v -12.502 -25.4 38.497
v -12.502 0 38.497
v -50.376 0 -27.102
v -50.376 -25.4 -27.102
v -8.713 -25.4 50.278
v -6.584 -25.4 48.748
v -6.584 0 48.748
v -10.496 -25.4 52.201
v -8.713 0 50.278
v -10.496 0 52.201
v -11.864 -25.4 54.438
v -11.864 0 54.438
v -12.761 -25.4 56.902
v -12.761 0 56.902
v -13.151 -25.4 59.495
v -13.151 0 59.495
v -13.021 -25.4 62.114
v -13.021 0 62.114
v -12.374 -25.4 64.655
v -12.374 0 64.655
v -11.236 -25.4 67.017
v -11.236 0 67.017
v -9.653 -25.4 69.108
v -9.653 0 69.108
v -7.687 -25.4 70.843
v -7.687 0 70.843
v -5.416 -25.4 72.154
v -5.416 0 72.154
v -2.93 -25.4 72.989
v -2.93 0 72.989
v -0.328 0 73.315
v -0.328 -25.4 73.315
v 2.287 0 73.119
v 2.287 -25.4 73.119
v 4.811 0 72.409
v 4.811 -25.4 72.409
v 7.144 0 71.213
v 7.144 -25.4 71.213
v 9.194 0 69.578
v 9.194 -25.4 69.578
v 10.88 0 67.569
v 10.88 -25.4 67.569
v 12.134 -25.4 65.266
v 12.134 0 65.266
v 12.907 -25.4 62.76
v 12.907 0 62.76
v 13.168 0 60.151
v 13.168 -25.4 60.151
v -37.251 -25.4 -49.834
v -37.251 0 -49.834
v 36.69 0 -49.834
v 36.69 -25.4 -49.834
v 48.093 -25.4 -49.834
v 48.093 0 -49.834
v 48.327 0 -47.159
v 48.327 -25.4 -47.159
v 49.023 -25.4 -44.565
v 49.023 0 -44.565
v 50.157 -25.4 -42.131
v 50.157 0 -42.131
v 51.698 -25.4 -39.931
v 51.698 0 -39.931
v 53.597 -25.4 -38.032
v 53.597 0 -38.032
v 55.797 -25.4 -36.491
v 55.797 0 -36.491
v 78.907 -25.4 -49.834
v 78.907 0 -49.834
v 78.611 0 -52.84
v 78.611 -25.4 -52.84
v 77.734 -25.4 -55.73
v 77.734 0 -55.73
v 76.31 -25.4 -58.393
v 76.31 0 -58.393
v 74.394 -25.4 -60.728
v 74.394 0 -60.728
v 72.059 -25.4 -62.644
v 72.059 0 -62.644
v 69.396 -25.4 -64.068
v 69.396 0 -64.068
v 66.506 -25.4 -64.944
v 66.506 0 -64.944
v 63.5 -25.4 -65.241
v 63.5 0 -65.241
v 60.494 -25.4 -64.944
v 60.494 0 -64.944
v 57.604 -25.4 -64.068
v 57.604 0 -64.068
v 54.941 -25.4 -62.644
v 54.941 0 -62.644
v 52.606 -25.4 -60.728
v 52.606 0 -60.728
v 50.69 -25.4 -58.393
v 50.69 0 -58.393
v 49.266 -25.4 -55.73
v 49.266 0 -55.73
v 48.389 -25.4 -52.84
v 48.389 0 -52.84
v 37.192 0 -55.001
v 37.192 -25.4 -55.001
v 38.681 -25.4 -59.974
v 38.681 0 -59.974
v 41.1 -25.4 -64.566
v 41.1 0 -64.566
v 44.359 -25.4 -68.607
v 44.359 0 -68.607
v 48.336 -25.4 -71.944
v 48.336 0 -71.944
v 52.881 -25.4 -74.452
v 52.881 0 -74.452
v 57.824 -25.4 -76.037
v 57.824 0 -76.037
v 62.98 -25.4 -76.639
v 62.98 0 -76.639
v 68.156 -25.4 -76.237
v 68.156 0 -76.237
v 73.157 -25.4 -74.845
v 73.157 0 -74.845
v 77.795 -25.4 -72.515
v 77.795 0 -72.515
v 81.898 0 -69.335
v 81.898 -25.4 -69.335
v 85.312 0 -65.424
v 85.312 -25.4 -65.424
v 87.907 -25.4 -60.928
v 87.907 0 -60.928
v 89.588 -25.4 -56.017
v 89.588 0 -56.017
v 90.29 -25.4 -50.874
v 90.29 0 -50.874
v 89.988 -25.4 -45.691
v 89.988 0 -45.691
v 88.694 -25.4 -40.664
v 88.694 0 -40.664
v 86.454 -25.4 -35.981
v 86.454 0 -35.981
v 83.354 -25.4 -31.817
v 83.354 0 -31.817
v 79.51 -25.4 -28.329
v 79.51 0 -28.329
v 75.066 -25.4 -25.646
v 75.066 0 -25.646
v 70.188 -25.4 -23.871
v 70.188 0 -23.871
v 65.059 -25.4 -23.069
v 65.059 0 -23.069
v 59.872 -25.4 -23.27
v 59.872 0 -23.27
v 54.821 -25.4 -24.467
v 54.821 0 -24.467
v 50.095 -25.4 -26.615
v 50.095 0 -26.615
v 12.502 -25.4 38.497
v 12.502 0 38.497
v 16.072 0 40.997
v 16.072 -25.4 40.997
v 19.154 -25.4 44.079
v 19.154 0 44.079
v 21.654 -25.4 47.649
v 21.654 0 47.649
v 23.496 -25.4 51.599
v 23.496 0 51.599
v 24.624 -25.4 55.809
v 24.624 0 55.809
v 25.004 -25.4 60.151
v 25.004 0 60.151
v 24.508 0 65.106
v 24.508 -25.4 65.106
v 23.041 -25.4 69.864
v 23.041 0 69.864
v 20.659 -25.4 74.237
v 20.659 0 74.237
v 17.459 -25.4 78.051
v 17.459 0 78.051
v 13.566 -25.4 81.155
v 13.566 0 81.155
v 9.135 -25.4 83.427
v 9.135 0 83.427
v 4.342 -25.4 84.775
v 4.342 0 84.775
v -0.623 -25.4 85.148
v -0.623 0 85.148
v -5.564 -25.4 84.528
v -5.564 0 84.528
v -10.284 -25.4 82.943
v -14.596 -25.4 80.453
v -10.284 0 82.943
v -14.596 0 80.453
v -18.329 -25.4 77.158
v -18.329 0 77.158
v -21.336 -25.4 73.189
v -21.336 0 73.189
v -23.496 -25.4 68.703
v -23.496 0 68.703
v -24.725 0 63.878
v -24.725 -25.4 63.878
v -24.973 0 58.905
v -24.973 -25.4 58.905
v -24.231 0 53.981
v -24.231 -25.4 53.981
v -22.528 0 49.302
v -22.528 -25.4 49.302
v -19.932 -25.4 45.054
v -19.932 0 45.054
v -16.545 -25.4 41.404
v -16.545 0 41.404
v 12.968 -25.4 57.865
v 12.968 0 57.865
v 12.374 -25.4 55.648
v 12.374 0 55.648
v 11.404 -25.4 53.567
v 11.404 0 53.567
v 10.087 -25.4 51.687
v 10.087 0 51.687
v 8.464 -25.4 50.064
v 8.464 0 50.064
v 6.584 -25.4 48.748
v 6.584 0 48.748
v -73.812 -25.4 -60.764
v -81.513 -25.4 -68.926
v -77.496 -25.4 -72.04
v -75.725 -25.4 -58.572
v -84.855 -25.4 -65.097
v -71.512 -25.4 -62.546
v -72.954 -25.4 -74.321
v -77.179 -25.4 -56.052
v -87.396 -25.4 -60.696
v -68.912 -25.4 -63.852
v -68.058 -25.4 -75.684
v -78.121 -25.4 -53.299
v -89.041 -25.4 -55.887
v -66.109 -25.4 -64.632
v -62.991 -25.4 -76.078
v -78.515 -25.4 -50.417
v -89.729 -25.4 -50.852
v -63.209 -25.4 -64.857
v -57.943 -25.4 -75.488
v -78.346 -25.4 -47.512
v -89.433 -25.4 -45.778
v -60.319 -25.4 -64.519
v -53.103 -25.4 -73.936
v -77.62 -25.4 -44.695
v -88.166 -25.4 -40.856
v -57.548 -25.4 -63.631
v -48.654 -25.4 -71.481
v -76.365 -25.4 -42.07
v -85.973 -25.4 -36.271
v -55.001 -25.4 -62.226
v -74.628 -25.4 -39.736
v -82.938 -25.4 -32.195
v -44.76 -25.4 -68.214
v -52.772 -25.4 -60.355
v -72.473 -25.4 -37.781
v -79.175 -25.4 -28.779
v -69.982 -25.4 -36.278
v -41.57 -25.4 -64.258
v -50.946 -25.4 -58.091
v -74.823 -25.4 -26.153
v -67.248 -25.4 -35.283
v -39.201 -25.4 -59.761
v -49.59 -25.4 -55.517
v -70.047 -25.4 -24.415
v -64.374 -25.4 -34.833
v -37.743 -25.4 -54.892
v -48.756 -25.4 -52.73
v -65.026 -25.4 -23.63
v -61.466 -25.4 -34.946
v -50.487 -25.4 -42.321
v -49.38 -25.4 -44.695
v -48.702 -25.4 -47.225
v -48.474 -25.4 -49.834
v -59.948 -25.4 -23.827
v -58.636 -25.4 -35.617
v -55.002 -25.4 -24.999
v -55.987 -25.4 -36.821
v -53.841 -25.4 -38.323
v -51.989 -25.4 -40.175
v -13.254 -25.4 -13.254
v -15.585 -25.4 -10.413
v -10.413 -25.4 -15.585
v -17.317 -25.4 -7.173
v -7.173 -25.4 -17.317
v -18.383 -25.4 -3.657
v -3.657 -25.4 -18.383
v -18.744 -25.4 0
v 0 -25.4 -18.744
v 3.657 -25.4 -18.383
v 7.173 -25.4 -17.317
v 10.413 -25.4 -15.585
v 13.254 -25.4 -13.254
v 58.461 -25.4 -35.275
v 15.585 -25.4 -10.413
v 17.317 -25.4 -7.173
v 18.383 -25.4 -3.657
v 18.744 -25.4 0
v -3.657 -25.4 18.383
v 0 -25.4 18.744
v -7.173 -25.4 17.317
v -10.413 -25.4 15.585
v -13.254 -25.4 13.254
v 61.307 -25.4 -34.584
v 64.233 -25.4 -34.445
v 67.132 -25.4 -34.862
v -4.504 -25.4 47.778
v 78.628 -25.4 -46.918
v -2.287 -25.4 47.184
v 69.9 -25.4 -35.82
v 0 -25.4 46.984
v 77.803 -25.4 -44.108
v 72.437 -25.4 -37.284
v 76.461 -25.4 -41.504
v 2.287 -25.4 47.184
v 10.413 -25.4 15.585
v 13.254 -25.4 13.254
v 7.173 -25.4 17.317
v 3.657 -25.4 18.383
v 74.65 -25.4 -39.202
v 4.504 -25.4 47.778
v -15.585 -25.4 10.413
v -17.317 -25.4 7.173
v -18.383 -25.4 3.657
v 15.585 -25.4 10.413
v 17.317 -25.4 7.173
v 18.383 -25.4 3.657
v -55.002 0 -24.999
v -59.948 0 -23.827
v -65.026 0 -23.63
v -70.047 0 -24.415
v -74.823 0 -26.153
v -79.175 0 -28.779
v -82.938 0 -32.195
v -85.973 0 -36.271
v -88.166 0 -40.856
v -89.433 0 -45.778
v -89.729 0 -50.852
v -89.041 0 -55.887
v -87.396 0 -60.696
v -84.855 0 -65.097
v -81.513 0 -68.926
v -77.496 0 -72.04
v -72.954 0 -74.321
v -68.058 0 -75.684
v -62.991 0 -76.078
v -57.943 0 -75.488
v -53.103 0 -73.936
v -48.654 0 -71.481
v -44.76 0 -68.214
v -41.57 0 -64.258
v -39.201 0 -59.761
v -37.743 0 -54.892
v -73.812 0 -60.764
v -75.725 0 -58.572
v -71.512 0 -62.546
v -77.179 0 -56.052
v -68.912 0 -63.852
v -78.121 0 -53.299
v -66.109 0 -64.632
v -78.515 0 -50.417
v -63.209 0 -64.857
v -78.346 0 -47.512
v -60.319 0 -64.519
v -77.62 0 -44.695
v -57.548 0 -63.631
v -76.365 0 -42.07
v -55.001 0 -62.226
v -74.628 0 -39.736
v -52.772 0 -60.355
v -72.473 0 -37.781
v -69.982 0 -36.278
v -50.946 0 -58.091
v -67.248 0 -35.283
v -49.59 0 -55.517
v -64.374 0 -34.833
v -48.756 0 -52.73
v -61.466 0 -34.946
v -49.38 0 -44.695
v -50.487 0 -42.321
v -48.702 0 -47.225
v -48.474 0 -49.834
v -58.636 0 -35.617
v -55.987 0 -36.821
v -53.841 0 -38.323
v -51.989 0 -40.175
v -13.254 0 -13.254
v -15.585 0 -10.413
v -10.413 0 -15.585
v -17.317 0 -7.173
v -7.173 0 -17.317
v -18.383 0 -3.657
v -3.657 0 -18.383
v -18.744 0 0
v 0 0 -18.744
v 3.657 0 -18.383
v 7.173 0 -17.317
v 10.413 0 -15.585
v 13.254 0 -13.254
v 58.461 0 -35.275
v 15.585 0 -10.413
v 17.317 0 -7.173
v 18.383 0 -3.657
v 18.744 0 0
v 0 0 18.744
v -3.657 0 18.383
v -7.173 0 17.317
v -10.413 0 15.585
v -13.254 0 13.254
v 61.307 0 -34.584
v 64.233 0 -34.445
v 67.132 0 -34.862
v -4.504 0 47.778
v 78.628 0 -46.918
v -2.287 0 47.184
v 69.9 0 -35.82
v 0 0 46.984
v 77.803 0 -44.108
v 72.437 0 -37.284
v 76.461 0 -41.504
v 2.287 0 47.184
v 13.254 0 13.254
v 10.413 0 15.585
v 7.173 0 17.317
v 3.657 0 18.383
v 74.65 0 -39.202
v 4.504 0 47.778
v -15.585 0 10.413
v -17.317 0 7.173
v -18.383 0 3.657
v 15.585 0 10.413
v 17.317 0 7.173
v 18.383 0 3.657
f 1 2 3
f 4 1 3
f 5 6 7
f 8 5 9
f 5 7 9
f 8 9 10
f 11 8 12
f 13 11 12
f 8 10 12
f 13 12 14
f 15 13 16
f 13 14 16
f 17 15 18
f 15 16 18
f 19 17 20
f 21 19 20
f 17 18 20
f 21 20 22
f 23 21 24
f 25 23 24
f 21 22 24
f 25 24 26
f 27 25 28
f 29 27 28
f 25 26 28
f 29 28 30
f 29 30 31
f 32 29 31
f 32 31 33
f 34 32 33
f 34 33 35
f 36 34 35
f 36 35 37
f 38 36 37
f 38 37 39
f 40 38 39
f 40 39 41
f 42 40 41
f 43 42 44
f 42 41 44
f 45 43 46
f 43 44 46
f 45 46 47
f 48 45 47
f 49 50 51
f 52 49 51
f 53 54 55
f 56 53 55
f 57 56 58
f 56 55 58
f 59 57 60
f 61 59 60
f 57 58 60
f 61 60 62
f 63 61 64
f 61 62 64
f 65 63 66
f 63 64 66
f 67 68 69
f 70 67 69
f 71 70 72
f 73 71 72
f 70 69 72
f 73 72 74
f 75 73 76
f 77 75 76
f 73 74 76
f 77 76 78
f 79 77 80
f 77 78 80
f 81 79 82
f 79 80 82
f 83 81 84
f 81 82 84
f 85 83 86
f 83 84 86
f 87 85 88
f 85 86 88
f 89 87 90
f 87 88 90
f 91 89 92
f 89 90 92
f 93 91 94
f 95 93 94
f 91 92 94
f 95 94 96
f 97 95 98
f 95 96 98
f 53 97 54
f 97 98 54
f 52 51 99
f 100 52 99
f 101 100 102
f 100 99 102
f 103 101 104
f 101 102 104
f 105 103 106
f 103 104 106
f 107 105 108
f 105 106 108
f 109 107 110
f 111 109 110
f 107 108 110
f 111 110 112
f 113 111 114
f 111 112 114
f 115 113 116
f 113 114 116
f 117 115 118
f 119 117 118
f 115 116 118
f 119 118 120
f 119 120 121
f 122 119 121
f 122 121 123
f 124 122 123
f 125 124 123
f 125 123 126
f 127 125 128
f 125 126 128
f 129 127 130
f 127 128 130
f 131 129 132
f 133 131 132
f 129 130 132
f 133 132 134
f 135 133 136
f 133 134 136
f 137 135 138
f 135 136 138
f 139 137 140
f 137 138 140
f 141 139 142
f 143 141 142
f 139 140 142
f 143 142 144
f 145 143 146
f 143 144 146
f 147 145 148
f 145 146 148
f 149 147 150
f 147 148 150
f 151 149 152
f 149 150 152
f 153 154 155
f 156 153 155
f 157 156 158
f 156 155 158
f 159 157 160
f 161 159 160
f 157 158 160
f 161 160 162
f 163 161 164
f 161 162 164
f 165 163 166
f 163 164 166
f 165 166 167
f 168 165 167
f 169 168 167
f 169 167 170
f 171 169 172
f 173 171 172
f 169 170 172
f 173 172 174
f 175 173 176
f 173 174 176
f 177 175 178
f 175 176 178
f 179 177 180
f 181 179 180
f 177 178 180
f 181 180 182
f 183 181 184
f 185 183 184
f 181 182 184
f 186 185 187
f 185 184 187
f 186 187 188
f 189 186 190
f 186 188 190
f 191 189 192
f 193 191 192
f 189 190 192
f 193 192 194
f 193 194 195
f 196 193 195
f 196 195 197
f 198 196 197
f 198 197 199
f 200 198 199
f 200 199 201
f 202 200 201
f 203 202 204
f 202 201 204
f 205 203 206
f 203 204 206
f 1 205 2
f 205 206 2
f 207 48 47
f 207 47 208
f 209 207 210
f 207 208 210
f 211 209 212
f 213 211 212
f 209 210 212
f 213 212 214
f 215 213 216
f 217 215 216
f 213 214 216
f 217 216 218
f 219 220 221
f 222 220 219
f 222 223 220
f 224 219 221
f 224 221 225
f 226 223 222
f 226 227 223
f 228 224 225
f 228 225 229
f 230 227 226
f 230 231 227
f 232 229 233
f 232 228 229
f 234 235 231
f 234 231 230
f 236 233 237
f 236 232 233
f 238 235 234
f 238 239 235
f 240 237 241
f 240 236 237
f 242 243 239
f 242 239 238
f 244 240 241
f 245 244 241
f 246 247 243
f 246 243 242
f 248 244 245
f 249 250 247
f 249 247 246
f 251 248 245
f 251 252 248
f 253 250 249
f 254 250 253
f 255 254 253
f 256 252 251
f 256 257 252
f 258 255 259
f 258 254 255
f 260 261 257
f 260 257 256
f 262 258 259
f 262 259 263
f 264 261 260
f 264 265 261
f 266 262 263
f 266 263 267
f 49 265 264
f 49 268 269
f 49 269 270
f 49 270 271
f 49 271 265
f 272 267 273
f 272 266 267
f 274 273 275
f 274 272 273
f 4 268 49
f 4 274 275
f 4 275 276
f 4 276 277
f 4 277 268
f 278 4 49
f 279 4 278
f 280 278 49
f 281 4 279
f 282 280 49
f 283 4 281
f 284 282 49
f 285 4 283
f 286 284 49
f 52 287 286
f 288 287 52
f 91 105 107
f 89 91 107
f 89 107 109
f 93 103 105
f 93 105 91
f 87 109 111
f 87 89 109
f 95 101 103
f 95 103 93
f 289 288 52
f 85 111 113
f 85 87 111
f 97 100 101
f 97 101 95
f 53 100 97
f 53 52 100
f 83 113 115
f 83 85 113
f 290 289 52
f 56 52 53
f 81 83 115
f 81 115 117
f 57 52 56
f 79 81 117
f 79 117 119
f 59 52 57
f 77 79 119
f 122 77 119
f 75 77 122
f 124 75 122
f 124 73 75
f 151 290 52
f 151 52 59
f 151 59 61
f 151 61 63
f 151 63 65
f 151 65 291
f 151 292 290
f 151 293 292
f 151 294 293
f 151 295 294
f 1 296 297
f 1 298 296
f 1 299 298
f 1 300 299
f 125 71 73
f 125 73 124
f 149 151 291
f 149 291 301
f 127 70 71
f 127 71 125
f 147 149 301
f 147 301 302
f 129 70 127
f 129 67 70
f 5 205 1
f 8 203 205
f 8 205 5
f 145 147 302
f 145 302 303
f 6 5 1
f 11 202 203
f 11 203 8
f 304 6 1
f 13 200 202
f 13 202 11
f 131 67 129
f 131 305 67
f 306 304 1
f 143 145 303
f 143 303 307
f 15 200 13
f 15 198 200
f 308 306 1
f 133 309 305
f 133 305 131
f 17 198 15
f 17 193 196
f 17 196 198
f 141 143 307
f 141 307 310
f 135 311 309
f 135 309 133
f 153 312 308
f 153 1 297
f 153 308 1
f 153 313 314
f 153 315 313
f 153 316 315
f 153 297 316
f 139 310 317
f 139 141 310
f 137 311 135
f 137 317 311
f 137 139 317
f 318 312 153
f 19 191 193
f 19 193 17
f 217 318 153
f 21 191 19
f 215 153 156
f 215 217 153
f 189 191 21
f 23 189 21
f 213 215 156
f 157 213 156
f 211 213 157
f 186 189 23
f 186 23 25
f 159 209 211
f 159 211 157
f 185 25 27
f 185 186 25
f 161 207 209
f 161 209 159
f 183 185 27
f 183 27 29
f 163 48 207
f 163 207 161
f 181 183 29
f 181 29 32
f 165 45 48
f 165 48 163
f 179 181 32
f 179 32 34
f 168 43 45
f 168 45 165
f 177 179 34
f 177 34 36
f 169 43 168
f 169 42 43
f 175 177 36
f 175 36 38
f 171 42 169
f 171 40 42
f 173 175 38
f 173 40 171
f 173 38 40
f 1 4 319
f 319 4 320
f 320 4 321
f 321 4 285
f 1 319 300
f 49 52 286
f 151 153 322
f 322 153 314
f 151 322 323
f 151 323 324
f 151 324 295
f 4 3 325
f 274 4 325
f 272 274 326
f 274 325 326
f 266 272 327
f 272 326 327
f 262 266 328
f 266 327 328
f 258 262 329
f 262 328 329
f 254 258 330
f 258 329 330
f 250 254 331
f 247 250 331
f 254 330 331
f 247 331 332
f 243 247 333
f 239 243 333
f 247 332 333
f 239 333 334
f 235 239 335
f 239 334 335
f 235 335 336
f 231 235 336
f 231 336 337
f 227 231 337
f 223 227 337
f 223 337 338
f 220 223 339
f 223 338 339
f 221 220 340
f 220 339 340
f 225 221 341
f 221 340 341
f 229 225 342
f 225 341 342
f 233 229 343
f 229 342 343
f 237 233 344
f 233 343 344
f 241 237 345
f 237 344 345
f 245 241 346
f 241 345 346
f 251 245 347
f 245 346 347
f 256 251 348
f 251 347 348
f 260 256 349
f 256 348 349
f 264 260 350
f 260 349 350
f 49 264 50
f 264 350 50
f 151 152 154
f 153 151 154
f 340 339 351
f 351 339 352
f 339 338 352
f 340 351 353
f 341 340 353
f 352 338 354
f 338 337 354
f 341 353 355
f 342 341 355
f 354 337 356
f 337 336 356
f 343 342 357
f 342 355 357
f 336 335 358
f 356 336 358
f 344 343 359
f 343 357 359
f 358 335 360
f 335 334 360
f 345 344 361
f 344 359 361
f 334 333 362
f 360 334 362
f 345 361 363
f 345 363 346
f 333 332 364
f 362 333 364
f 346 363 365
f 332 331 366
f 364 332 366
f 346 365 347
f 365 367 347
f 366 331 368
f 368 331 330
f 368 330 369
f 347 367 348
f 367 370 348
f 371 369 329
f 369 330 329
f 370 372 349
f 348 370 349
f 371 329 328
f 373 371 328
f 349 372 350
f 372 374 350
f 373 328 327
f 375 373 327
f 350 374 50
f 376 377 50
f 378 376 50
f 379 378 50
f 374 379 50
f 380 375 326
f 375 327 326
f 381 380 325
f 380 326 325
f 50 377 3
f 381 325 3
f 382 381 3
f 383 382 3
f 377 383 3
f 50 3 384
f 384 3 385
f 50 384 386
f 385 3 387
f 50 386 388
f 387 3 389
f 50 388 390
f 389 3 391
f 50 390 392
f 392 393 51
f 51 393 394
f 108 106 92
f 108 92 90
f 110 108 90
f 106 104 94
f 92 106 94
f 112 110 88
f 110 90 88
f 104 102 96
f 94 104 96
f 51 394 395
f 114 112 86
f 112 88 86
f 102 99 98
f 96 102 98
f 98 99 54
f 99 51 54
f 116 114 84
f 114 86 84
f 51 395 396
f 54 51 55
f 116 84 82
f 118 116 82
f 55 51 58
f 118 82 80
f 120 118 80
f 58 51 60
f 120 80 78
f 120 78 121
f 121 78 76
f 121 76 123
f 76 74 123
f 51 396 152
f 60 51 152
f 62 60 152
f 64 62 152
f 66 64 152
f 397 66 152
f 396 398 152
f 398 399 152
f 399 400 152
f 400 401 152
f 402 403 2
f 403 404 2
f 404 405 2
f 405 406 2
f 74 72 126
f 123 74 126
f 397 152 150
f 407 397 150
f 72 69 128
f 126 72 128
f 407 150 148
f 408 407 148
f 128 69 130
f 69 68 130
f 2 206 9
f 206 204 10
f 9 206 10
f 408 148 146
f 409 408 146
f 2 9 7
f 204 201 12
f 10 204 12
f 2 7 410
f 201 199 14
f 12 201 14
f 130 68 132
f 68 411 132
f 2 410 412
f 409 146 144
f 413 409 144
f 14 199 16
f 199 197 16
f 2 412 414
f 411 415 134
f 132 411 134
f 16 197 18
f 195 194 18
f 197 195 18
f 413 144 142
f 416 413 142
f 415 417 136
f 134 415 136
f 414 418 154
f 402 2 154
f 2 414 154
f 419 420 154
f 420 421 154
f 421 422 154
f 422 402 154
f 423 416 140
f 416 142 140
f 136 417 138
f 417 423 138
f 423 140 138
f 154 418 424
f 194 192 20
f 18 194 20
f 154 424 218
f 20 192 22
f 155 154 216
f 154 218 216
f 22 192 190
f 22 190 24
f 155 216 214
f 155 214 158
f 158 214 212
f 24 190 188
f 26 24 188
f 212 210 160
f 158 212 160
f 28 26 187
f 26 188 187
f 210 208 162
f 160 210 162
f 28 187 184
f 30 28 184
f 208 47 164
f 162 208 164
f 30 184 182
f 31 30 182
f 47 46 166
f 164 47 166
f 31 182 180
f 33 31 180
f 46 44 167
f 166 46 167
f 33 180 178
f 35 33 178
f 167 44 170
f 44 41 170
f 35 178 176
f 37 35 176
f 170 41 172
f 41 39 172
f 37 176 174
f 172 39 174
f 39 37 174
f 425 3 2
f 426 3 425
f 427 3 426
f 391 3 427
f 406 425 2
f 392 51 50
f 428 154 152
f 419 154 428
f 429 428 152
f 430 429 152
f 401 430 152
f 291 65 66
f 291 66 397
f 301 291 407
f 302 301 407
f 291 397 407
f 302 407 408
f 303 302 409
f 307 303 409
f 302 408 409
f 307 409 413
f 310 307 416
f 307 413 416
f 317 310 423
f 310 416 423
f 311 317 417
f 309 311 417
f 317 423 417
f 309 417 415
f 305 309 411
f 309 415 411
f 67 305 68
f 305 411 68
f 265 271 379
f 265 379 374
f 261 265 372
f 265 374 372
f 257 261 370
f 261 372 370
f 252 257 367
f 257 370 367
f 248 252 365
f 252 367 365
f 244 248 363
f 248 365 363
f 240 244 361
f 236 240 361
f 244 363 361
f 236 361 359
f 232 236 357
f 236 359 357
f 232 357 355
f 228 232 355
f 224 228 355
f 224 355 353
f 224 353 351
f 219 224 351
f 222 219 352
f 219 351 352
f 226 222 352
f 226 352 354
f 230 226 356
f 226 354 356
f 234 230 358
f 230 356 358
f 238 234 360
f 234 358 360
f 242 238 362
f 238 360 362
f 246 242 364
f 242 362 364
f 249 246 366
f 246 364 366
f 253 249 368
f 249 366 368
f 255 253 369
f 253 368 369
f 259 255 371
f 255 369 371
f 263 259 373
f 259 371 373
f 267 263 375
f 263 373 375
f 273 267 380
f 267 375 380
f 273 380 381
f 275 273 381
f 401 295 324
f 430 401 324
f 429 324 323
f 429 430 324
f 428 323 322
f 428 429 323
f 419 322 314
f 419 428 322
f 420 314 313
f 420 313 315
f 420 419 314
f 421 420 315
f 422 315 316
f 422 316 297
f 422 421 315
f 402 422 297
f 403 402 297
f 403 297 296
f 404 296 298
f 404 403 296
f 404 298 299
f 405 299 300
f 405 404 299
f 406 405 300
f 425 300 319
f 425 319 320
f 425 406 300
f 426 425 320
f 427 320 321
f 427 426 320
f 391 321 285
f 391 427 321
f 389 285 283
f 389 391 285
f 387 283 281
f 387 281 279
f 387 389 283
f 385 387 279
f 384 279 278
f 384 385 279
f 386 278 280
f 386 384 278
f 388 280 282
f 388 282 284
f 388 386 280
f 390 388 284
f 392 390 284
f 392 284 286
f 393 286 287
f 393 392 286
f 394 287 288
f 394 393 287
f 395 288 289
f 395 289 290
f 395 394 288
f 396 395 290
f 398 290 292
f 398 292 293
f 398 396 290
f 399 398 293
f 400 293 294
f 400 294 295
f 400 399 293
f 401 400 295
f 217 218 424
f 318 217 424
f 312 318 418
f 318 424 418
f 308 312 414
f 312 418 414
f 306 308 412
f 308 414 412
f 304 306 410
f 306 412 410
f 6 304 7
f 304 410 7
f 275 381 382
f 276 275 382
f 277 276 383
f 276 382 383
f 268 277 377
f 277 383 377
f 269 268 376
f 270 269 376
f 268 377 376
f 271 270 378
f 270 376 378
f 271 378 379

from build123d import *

# Parameters (mm, degrees)
F0_R     = 18.7435509256
F1_DEPTH = 25.4


with BuildPart() as f1:
    # F0 (on Front) → F1 (new body)
    with BuildSketch(Plane.XZ):
        with BuildLine():
            Line((-12.5020157932, 38.4971815486), (-6.5838834434, 48.7476874643))
            ThreePointArc((-6.5838834434, 48.7476874643), (-6.5838834434, 71.5549287346), (13.1677668869, 60.1513080994))
            ThreePointArc((13.1677668869, 60.1513080994), (11.4036206351, 53.567424656), (6.5838834434, 48.7476874643))
            Line((6.5838834434, 48.7476874643), (12.5020157932, 38.4971815486))
            ThreePointArc((12.5020157932, 38.4971815486), (21.6541265509, 47.6492923062), (25.0040315864, 60.1513080994))
            ThreePointArc((25.0040315864, 60.1513080994), (-12.5020157932, 81.8054346503), (-12.5020157932, 38.4971815486))
        make_face()
        with BuildLine():
            ThreePointArc((6.5838834434, 48.7476874643), (0, 46.9835412126), (-6.5838834434, 48.7476874643))
            Line((-6.5838834434, 48.7476874643), (-12.5020157932, 38.4971815486))
            ThreePointArc((-12.5020157932, 38.4971815486), (0, 35.147276513), (12.5020157932, 38.4971815486))
            Line((12.5020157932, 38.4971815486), (6.5838834434, 48.7476874643))
        make_face()
        with BuildLine():
            ThreePointArc((12.5020157932, 38.4971815486), (0, 35.147276513), (-12.5020157932, 38.4971815486))
            Line((-12.5020157932, 38.4971815486), (-50.3756712224, -27.1019139232))
            ThreePointArc((-50.3756712224, -27.1019139232), (-40.767995742, -36.7095894036), (-37.2513424448, -49.8339181812))
            Line((-37.2513424448, -49.8339181812), (36.6895705679, -49.8339181812))
            ThreePointArc((36.6895705679, -49.8339181812), (40.2814870254, -36.4287034651), (50.094785284, -26.6154052066))
            Line((50.094785284, -26.6154052066), (12.5020157932, 38.4971815486))
        make_face()
        Circle(F0_R, mode=Mode.SUBTRACT)
        with BuildLine():
            Line((55.796700688, -36.491412387), (50.094785284, -26.6154052066))
            ThreePointArc((50.094785284, -26.6154052066), (40.2814870254, -36.4287034651), (36.6895705679, -49.8339181812))
            Line((36.6895705679, -49.8339181812), (48.0934013761, -49.8339181812))
            ThreePointArc((48.0934013761, -49.8339181812), (50.1574942058, -42.1306188692), (55.796700688, -36.491412387))
        make_face()
        with BuildLine():
            ThreePointArc((90.3104294321, -49.8339181812), (76.905214716, -26.6154052066), (50.094785284, -26.6154052066))
            Line((50.094785284, -26.6154052066), (55.796700688, -36.491412387))
            ThreePointArc((55.796700688, -36.491412387), (71.203299312, -36.491412387), (78.9065986239, -49.8339181812))
            ThreePointArc((78.9065986239, -49.8339181812), (63.5, -65.2405168051), (48.0934013761, -49.8339181812))
            Line((48.0934013761, -49.8339181812), (36.6895705679, -49.8339181812))
            ThreePointArc((36.6895705679, -49.8339181812), (63.5, -76.6443476133), (90.3104294321, -49.8339181812))
        make_face()
        with BuildLine():
            ThreePointArc((-37.2513424448, -49.8339181812), (-40.767995742, -36.7095894036), (-50.3756712224, -27.1019139232))
            Line((-50.3756712224, -27.1019139232), (-55.9869244457, -36.8208896001))
            ThreePointArc((-55.9869244457, -36.8208896001), (-50.4869714189, -42.3208426269), (-48.4738488914, -49.8339181812))
            Line((-48.4738488914, -49.8339181812), (-37.2513424448, -49.8339181812))
        make_face()
        with BuildLine():
            Line((-55.9869244457, -36.8208896001), (-50.3756712224, -27.1019139232))
            ThreePointArc((-50.3756712224, -27.1019139232), (-86.232004258, -62.9582469588), (-37.2513424448, -49.8339181812))
            Line((-37.2513424448, -49.8339181812), (-48.4738488914, -49.8339181812))
            ThreePointArc((-48.4738488914, -49.8339181812), (-76.5130285811, -57.3469937355), (-55.9869244457, -36.8208896001))
        make_face()
    extrude(amount=F1_DEPTH)


solid = f1.part
